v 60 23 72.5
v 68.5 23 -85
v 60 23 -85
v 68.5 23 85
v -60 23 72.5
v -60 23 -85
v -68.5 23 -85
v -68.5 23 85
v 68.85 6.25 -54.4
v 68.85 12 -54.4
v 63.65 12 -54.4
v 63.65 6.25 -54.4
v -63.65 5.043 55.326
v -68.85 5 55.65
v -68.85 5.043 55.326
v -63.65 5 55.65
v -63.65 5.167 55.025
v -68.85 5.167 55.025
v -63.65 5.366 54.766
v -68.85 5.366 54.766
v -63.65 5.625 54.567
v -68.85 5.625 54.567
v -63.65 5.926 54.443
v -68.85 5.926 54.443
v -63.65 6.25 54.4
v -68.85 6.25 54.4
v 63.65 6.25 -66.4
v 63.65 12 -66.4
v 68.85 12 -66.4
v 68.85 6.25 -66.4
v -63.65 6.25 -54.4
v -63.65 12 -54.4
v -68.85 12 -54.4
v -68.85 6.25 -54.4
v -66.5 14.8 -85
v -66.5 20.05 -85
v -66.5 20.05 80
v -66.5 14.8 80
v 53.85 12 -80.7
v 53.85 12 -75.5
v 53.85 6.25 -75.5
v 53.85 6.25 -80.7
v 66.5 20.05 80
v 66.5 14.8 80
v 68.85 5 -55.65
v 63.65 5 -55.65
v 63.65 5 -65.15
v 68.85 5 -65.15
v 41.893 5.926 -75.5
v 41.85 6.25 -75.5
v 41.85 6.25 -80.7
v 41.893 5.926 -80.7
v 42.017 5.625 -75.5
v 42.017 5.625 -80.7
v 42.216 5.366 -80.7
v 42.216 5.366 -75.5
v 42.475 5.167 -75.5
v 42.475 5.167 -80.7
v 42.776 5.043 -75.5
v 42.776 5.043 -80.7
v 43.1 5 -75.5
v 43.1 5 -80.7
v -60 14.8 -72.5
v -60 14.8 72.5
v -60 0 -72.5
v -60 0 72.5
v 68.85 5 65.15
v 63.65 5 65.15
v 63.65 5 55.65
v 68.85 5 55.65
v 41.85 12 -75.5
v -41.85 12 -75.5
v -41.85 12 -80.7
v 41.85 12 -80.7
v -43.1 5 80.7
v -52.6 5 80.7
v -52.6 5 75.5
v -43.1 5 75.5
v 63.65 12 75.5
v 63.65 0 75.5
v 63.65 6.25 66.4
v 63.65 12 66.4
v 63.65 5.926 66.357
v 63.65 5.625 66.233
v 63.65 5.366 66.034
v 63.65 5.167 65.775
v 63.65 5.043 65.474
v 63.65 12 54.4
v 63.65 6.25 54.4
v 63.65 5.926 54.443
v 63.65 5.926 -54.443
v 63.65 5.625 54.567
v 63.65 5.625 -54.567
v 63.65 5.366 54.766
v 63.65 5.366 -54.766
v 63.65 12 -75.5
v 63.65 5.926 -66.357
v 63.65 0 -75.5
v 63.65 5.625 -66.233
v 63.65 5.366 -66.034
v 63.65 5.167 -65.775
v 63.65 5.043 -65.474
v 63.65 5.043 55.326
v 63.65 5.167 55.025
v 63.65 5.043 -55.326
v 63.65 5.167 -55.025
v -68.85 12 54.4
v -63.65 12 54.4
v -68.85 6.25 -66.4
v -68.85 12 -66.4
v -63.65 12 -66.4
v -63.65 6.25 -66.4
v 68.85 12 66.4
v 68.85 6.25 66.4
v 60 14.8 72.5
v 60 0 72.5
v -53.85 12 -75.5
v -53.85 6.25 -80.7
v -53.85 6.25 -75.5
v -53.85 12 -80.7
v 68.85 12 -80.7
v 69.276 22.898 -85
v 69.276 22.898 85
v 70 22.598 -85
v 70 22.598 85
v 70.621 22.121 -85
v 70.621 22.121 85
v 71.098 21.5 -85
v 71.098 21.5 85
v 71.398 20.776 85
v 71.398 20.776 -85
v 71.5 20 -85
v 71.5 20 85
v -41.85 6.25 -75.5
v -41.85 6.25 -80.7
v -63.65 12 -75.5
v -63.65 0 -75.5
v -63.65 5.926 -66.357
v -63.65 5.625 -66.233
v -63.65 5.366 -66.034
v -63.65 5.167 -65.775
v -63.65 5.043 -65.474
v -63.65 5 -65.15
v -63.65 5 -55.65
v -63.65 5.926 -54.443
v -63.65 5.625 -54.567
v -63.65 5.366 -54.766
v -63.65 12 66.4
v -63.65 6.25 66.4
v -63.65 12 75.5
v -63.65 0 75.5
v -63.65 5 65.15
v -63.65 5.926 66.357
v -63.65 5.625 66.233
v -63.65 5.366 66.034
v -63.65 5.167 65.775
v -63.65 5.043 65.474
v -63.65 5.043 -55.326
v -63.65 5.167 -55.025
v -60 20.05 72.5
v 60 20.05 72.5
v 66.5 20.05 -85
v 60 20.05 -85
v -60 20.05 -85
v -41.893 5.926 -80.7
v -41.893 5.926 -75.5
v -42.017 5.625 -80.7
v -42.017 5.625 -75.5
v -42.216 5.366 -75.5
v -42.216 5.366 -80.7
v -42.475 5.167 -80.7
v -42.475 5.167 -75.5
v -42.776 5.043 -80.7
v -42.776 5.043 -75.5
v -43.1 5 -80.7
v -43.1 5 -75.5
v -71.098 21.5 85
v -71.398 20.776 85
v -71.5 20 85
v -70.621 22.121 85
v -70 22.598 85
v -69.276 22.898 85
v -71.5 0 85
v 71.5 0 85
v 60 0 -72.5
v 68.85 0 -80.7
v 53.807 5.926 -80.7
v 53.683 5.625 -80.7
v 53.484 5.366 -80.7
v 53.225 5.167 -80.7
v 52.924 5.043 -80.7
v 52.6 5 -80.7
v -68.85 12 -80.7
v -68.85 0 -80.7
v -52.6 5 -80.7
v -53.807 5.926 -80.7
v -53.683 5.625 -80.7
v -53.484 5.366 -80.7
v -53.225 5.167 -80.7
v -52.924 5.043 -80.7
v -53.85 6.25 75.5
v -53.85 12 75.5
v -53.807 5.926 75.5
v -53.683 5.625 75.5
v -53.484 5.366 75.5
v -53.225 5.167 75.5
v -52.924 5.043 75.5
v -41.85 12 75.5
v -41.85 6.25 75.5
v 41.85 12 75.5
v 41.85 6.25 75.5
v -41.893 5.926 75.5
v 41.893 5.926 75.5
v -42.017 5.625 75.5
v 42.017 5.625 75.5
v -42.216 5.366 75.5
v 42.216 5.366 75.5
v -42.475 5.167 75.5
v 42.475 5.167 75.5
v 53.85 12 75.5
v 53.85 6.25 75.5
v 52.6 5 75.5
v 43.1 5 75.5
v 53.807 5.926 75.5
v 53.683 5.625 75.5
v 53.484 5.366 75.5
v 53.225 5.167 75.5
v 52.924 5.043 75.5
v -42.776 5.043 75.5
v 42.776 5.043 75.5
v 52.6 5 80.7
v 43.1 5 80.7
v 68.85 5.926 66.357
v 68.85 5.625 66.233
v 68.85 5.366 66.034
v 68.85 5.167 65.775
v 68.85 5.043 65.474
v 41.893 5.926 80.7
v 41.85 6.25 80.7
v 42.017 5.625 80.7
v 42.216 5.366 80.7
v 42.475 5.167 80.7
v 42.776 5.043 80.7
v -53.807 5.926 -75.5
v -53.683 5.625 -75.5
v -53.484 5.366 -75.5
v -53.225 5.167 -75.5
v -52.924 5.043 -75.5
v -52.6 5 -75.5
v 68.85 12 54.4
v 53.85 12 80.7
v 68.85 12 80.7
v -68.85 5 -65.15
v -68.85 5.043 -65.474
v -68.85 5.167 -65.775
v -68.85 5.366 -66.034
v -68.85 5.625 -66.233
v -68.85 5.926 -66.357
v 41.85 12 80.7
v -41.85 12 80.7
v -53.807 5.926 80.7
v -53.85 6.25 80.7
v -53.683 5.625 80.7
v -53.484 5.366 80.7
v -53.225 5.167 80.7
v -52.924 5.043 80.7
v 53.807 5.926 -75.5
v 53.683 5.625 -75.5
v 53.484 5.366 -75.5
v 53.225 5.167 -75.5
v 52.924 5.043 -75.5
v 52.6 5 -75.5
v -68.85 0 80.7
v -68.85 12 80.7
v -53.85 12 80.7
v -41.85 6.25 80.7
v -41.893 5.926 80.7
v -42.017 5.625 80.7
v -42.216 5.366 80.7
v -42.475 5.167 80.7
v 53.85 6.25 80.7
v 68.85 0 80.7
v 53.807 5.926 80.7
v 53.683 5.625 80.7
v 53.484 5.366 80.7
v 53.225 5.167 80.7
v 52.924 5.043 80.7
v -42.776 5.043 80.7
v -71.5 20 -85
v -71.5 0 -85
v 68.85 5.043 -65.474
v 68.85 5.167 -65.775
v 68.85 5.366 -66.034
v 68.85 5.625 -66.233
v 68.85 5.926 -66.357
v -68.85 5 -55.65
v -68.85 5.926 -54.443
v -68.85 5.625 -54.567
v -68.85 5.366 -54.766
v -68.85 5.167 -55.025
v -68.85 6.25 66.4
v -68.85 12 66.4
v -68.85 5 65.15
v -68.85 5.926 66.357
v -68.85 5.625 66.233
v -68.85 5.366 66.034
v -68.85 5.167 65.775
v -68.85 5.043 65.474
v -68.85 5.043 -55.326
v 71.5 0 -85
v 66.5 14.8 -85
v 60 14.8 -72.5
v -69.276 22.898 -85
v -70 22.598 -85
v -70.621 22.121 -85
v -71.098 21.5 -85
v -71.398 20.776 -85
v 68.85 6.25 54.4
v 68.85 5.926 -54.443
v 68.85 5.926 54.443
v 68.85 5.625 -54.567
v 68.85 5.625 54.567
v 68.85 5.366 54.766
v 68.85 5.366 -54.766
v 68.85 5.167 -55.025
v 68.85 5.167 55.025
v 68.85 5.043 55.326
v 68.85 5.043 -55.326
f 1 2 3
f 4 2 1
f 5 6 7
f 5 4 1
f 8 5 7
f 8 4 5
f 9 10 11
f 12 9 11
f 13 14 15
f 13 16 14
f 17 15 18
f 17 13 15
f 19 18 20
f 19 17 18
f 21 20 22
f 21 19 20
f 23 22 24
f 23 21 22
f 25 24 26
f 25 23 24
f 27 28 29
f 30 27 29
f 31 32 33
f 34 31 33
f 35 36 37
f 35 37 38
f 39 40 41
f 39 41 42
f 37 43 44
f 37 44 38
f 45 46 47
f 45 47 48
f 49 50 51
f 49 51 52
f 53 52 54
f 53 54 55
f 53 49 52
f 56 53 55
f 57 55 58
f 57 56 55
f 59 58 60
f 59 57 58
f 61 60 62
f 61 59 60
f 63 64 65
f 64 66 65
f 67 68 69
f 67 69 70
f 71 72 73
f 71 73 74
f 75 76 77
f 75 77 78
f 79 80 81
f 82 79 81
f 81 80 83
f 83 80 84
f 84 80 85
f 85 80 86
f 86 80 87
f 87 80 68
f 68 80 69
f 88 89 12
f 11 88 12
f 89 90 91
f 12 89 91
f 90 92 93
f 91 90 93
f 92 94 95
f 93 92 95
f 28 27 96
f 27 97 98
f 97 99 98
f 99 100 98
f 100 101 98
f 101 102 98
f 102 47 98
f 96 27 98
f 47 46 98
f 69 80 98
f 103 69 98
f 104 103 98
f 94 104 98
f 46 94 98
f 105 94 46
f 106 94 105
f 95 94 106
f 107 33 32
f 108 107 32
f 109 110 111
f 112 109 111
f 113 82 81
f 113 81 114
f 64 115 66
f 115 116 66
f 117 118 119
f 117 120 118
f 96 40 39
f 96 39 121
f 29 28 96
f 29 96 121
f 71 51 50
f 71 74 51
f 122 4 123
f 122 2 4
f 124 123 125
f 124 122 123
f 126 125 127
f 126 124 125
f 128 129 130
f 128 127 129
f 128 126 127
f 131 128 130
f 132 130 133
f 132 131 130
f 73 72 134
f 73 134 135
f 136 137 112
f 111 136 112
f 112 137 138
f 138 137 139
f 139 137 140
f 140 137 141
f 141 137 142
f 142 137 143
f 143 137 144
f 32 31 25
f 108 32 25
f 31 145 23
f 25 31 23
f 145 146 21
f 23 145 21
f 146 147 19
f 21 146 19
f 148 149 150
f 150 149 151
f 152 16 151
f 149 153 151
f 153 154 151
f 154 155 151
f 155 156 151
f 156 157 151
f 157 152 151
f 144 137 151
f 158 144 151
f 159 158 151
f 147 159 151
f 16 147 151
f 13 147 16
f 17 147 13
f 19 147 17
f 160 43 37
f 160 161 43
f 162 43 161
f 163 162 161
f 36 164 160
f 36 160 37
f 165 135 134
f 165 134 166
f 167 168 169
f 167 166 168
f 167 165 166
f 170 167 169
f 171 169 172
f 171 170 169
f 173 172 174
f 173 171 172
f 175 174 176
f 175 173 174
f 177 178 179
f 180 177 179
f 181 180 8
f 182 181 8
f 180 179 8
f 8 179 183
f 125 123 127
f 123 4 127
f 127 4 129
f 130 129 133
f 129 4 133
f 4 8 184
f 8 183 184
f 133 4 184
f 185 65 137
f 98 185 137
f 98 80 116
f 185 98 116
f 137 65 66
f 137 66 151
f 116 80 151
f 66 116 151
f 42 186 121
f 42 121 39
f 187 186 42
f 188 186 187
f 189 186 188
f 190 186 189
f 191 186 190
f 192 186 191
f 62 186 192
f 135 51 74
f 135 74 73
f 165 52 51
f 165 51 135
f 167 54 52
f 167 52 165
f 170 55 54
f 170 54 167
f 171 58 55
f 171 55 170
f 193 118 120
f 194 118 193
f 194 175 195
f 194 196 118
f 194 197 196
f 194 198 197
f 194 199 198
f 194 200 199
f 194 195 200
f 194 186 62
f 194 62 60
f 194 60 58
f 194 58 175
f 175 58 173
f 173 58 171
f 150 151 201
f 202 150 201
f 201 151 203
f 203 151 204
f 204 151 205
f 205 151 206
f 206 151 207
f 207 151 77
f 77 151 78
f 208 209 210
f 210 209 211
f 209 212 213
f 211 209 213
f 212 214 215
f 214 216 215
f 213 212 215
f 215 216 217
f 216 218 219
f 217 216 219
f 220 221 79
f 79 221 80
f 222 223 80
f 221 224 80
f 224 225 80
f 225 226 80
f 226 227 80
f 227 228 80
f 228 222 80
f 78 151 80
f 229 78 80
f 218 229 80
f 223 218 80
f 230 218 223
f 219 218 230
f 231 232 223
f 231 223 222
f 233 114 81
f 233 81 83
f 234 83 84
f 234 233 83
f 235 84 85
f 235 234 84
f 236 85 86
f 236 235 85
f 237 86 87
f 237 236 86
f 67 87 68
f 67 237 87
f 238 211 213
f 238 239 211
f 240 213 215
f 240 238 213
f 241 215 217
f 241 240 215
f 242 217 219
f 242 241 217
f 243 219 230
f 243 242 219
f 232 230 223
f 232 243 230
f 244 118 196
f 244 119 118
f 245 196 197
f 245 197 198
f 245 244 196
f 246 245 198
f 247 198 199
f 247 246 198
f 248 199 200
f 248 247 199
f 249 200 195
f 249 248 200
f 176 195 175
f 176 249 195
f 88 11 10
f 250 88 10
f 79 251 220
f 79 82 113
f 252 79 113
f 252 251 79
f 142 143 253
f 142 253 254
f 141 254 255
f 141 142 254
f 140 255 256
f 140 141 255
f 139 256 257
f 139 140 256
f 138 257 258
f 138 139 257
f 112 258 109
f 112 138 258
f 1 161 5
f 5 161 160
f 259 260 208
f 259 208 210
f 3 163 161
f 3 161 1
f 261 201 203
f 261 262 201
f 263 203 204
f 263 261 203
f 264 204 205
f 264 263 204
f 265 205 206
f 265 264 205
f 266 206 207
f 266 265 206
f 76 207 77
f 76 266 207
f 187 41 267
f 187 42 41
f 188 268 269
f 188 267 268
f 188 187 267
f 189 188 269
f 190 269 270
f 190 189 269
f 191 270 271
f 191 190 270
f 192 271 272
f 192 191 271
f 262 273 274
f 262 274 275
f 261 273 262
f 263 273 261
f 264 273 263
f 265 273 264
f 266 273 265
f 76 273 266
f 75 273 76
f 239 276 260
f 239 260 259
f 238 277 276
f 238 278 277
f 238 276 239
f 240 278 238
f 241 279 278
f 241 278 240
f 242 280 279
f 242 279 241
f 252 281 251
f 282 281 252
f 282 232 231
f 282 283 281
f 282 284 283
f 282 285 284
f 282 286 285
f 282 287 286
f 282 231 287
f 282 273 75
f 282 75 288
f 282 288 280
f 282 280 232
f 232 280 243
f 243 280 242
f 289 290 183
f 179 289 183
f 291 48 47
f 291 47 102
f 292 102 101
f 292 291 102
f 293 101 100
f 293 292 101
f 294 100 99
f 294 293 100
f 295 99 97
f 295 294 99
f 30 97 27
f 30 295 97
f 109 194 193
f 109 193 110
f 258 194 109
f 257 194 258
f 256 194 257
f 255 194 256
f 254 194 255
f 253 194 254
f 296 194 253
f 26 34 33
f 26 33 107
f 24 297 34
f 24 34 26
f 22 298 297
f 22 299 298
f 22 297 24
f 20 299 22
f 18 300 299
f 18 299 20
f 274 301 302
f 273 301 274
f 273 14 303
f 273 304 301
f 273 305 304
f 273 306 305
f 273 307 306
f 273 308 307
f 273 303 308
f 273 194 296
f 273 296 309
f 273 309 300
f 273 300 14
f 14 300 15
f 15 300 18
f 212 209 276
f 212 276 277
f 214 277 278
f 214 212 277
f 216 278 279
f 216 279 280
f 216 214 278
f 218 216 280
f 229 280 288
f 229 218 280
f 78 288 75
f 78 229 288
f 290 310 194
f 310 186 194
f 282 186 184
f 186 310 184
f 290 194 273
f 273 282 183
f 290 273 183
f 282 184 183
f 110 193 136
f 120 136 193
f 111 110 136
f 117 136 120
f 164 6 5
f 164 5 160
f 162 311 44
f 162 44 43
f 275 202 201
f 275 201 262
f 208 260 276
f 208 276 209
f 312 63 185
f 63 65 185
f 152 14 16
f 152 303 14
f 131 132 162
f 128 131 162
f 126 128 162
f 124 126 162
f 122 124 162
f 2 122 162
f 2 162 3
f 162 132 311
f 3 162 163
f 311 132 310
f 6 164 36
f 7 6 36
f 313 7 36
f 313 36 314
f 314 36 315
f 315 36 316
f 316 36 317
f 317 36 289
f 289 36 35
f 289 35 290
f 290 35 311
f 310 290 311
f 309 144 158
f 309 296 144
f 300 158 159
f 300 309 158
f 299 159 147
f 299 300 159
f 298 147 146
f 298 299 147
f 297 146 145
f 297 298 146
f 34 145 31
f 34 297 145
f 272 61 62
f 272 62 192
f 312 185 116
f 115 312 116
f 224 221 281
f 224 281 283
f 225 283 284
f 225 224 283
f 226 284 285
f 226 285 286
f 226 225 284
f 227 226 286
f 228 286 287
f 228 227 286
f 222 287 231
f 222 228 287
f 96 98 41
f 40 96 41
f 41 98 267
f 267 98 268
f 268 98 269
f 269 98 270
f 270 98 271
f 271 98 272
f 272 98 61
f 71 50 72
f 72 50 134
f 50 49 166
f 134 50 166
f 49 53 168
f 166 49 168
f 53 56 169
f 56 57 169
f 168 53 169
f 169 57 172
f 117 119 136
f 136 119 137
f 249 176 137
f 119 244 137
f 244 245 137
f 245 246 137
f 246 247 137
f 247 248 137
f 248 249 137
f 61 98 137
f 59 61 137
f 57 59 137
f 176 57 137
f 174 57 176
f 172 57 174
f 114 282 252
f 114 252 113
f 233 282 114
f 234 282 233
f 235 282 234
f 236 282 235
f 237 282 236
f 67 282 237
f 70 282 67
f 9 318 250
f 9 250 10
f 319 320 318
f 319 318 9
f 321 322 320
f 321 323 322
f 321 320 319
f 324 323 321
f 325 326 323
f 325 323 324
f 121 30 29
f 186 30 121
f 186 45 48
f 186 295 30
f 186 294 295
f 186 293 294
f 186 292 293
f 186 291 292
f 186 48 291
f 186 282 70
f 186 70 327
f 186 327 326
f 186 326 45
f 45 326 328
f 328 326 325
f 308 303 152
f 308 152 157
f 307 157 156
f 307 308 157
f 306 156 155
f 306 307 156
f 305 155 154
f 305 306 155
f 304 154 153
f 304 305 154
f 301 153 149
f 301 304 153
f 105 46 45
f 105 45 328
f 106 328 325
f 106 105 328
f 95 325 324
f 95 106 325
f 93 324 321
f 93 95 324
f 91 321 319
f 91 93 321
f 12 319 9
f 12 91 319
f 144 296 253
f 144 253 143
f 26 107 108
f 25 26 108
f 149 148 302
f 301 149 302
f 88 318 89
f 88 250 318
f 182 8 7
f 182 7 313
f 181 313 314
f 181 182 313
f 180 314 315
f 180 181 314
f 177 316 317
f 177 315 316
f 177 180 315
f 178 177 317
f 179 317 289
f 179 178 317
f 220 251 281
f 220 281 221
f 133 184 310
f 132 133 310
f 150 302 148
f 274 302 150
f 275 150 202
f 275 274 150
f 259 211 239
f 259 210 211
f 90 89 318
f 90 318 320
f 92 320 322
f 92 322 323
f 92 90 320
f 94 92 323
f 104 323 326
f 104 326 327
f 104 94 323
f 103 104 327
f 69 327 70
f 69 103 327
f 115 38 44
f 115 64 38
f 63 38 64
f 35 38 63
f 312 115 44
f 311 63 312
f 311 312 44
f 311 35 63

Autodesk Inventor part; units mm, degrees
ref_plane "YZ Plane" through (0, 0, 0) normal (1, 0, 0) x (0, 1, 0)
ref_plane "XZ Plane" through (0, 0, 0) normal (0, 1, 0) x (-1, 0, 0)
ref_plane "XY Plane" through (0, 0, 0) normal (0, 0, 1) x (1, 0, 0)
sketch "Sketch1" plane through (0, 0, 0) normal (0, 1, 0) x (-1, 0, 0)
  line L0 (-71.5, -85) -> (71.5, -85)
  line L1 (71.5, -85) -> (71.5, 85)
  line L2 (71.5, 85) -> (-71.5, 85)
  line L3 (-71.5, 85) -> (-71.5, -85)
  line L4 (-71.5, -85) -> (71.5, 85) construction
  line L5 (71.5, -85) -> (-71.5, 85) construction
  point P0 (0, 0)
  dimension "d0" = 143
  dimension "d1" = 170
extrude "Base" add sketch "Sketch1" along normal blind 23
sketch "Sketch2" plane through (0, 0, 0) normal (0, -1, 0) x (1, 0, 0)
  line L0 (-60, -72.5) -> (60, -72.5)
  line L1 (60, -72.5) -> (60, 72.5)
  line L2 (60, 72.5) -> (-60, 72.5)
  line L3 (-60, 72.5) -> (-60, -72.5)
  line L4 (-60, -72.5) -> (60, 72.5) construction
  line L5 (60, -72.5) -> (-60, 72.5) construction
  point P0 (0, 0)
  dimension "d4" = 120
  dimension "d5" = 145
extrude "Extrusion2" cut sketch "Sketch2" against normal through all
sketch "Sketch3" plane through (0, 0, 0) normal (0, -1, 0) x (1, 0, 0)
  line L0 (63.65, -75.5) -> (-63.65, -75.5)
  line L1 (-63.65, -75.5) -> (-63.65, 75.5)
  line L2 (-63.65, 75.5) -> (63.65, 75.5)
  line L3 (63.65, 75.5) -> (63.65, -75.5)
  line L4 (-60, 72.5) -> (60, 72.5) projected
  line L5 (-60, -72.5) -> (-60, 72.5) projected
  line L6 (68.85, -80.7) -> (-68.85, -80.7)
  line L7 (-68.85, -80.7) -> (-68.85, 80.7)
  line L8 (-68.85, 80.7) -> (68.85, 80.7)
  line L9 (68.85, 80.7) -> (68.85, -80.7)
  line L10 (-71.5, 85) -> (71.5, 85) projected
  point P0 (0, 0)
  point P1 (63.65, 0)
  point P2 (68.85, 0)
  dimension "d9" = 3.65
  dimension "d10" = 5.2
  dimension "d11" = 12.5
  dimension "d38" = 5.2
  dimension "d39" = 151
extrude "Extrusion3" cut sketch "Sketch3" against normal blind 12
sketch "Sketch4" plane through (0, 12, 0) normal (0, -1, 0) x (1, 0, 0)
  line L0 (-68.85, 80.7) -> (68.85, 80.7) projected
  line L1 (63.65, 75.5) -> (-63.65, 75.5) projected
  line L2 (-53.85, 80.7) -> (-41.85, 80.7)
  line L3 (-41.85, 80.7) -> (-41.85, 75.5)
  line L4 (-41.85, 75.5) -> (-53.85, 75.5)
  line L5 (-53.85, 75.5) -> (-53.85, 80.7)
  line L6 (-68.85, -80.7) -> (-68.85, 80.7) projected
  line L7 (-63.65, 75.5) -> (-63.65, -75.5) projected
  line L8 (-63.65, 66.4) -> (-68.85, 66.4)
  line L9 (-68.85, 66.4) -> (-68.85, 54.4)
  line L10 (-68.85, 54.4) -> (-63.65, 54.4)
  line L11 (-63.65, 54.4) -> (-63.65, 66.4)
  line L12 (63.65, -75.5) -> (63.65, 75.5) projected
  line L13 (68.85, 80.7) -> (68.85, -80.7) projected
  line L14 (63.65, 66.4) -> (68.85, 66.4)
  line L15 (68.85, 66.4) -> (68.85, 54.4)
  line L16 (68.85, 54.4) -> (63.65, 54.4)
  line L17 (63.65, 54.4) -> (63.65, 66.4)
  line L18 (-63.65, -75.5) -> (63.65, -75.5) projected
  line L19 (68.85, -80.7) -> (-68.85, -80.7) projected
  line L20 (-53.85, -75.5) -> (-41.85, -75.5)
  line L21 (-41.85, -75.5) -> (-41.85, -80.7)
  line L22 (-41.85, -80.7) -> (-53.85, -80.7)
  line L23 (-53.85, -80.7) -> (-53.85, -75.5)
  line L24 (-68.85, -66.4) -> (-63.65, -66.4)
  line L25 (-63.65, -66.4) -> (-63.65, -54.4)
  line L26 (-63.65, -54.4) -> (-68.85, -54.4)
  line L27 (-68.85, -54.4) -> (-68.85, -66.4)
  line L28 (53.85, -80.7) -> (41.85, -80.7)
  line L29 (41.85, -80.7) -> (41.85, -75.5)
  line L30 (41.85, -75.5) -> (53.85, -75.5)
  line L31 (53.85, -75.5) -> (53.85, -80.7)
  line L32 (68.85, -54.4) -> (63.65, -54.4)
  line L33 (63.65, -54.4) -> (63.65, -66.4)
  line L34 (63.65, -66.4) -> (68.85, -66.4)
  line L35 (68.85, -66.4) -> (68.85, -54.4)
  line L36 (53.85, 75.5) -> (41.85, 75.5)
  line L37 (41.85, 75.5) -> (41.85, 80.7)
  line L38 (41.85, 80.7) -> (53.85, 80.7)
  line L39 (53.85, 80.7) -> (53.85, 75.5)
  point P0 (0, 0)
  point P1 (66.25, 66.4)
  point P2 (-66.25, 66.4)
  point P3 (-53.85, -78.1)
  point P4 (-53.85, 78.1)
  point P5 (66.25, -54.4)
  point P6 (-66.25, -54.4)
  point P7 (41.85, 78.1)
  point P8 (41.85, -78.1)
  dimension "d14" = 12
  dimension "d15" = 15
  dimension "d16" = 12
  dimension "d17" = 14.3
  dimension "d18" = 12
  dimension "d19" = 12
  dimension "d20" = 14.3
  dimension "d21" = 12
  dimension "d22" = 12
  dimension "d23" = 15
  dimension "d24" = 12
  dimension "d25" = 12
extrude "Extrusion4" add sketch "Sketch4" along normal blind 7 contours L0 L3 L1 L5 | L8 L7 L10 L6 | L0 L39 L1 L37 | L26 L7 L24 L6 | L13 L16 L12 L14 | L23 L18 L21 L19 | L13 L34 L12 L32 | L29 L18 L31 L19
fillet "Fillet1" radius 1.25 16 edges at (-66.25, 5, 54.4) (-66.25, 5, 66.4) (-66.25, 5, -66.4) (-66.25, 5, -54.4) (66.25, 5, -66.4) (66.25, 5, -54.4) (66.25, 5, 54.4) (66.25, 5, 66.4) (53.85, 5, -78.1) (41.85, 5, -78.1) (-53.85, 5, -78.1) (-41.85, 5, -78.1) (-53.85, 5, 78.1) (-41.85, 5, 78.1) (41.85, 5, 78.1) (53.85, 5, 78.1)
sketch "Sketch5" plane through (71.5, 0, -85) normal (0, 0, -1) x (-1, 0, 0)
  line L0 (71.5, 0) -> (71.5, 23) construction
  line L1 (131.5, 23) -> (11.5, 23) construction
  line L2 (5, 20.05) -> (138, 20.05)
  line L3 (138, 20.05) -> (138, 14.8)
  line L4 (138, 14.8) -> (5, 14.8)
  line L5 (5, 14.8) -> (5, 20.05)
  line L6 (0, 0) -> (143, 0) projected
  point P0 (71.5, 20.05)
  dimension "d29" = 133
  dimension "d30" = 5.25
  dimension "d31" = 14.8
extrude "Extrusion5" cut sketch "Sketch5" against normal blind 165
fillet "Fillet2" radius 3 2 edges at (71.5, 23, 0) (-71.5, 23, 0)
sketch "Sketch6" plane through (71.5, 0, -85) normal (0, 0, -1) x (-1, 0, 0)
  line L0 (3, 23) -> (140, 23) projected
  line L1 (5, 20.05) -> (138, 20.05) projected
  line L2 (11.5, 23) -> (131.5, 23)
  line L3 (131.5, 23) -> (131.5, 20.05)
  line L4 (131.5, 20.05) -> (11.5, 20.05)
  line L5 (11.5, 20.05) -> (11.5, 23)
  line L6 (0, 0) -> (143, 0) construction
  point P0 (71.5, 0)
  point P1 (71.5, 23)
  point P2 (71.5, 0)
  dimension "d35" = 120
extrude "Extrusion6" cut sketch "Sketch6" against normal blind 12.5
equation "\"d9\" = d8"
equation "\"d16\" = d14"
equation "\"d18\" = d14"
equation "\"d19\" = d14"
equation "\"d20\" = d17"
equation "\"d21\" = d19"
equation "\"d22\" = d14"
equation "\"d23\" = d15"
equation "\"d24\" = d14"
equation "\"d8\" = -0.5 * d10 + 0.5 * d11"
properties part number "top_bracket_for_5mm"
